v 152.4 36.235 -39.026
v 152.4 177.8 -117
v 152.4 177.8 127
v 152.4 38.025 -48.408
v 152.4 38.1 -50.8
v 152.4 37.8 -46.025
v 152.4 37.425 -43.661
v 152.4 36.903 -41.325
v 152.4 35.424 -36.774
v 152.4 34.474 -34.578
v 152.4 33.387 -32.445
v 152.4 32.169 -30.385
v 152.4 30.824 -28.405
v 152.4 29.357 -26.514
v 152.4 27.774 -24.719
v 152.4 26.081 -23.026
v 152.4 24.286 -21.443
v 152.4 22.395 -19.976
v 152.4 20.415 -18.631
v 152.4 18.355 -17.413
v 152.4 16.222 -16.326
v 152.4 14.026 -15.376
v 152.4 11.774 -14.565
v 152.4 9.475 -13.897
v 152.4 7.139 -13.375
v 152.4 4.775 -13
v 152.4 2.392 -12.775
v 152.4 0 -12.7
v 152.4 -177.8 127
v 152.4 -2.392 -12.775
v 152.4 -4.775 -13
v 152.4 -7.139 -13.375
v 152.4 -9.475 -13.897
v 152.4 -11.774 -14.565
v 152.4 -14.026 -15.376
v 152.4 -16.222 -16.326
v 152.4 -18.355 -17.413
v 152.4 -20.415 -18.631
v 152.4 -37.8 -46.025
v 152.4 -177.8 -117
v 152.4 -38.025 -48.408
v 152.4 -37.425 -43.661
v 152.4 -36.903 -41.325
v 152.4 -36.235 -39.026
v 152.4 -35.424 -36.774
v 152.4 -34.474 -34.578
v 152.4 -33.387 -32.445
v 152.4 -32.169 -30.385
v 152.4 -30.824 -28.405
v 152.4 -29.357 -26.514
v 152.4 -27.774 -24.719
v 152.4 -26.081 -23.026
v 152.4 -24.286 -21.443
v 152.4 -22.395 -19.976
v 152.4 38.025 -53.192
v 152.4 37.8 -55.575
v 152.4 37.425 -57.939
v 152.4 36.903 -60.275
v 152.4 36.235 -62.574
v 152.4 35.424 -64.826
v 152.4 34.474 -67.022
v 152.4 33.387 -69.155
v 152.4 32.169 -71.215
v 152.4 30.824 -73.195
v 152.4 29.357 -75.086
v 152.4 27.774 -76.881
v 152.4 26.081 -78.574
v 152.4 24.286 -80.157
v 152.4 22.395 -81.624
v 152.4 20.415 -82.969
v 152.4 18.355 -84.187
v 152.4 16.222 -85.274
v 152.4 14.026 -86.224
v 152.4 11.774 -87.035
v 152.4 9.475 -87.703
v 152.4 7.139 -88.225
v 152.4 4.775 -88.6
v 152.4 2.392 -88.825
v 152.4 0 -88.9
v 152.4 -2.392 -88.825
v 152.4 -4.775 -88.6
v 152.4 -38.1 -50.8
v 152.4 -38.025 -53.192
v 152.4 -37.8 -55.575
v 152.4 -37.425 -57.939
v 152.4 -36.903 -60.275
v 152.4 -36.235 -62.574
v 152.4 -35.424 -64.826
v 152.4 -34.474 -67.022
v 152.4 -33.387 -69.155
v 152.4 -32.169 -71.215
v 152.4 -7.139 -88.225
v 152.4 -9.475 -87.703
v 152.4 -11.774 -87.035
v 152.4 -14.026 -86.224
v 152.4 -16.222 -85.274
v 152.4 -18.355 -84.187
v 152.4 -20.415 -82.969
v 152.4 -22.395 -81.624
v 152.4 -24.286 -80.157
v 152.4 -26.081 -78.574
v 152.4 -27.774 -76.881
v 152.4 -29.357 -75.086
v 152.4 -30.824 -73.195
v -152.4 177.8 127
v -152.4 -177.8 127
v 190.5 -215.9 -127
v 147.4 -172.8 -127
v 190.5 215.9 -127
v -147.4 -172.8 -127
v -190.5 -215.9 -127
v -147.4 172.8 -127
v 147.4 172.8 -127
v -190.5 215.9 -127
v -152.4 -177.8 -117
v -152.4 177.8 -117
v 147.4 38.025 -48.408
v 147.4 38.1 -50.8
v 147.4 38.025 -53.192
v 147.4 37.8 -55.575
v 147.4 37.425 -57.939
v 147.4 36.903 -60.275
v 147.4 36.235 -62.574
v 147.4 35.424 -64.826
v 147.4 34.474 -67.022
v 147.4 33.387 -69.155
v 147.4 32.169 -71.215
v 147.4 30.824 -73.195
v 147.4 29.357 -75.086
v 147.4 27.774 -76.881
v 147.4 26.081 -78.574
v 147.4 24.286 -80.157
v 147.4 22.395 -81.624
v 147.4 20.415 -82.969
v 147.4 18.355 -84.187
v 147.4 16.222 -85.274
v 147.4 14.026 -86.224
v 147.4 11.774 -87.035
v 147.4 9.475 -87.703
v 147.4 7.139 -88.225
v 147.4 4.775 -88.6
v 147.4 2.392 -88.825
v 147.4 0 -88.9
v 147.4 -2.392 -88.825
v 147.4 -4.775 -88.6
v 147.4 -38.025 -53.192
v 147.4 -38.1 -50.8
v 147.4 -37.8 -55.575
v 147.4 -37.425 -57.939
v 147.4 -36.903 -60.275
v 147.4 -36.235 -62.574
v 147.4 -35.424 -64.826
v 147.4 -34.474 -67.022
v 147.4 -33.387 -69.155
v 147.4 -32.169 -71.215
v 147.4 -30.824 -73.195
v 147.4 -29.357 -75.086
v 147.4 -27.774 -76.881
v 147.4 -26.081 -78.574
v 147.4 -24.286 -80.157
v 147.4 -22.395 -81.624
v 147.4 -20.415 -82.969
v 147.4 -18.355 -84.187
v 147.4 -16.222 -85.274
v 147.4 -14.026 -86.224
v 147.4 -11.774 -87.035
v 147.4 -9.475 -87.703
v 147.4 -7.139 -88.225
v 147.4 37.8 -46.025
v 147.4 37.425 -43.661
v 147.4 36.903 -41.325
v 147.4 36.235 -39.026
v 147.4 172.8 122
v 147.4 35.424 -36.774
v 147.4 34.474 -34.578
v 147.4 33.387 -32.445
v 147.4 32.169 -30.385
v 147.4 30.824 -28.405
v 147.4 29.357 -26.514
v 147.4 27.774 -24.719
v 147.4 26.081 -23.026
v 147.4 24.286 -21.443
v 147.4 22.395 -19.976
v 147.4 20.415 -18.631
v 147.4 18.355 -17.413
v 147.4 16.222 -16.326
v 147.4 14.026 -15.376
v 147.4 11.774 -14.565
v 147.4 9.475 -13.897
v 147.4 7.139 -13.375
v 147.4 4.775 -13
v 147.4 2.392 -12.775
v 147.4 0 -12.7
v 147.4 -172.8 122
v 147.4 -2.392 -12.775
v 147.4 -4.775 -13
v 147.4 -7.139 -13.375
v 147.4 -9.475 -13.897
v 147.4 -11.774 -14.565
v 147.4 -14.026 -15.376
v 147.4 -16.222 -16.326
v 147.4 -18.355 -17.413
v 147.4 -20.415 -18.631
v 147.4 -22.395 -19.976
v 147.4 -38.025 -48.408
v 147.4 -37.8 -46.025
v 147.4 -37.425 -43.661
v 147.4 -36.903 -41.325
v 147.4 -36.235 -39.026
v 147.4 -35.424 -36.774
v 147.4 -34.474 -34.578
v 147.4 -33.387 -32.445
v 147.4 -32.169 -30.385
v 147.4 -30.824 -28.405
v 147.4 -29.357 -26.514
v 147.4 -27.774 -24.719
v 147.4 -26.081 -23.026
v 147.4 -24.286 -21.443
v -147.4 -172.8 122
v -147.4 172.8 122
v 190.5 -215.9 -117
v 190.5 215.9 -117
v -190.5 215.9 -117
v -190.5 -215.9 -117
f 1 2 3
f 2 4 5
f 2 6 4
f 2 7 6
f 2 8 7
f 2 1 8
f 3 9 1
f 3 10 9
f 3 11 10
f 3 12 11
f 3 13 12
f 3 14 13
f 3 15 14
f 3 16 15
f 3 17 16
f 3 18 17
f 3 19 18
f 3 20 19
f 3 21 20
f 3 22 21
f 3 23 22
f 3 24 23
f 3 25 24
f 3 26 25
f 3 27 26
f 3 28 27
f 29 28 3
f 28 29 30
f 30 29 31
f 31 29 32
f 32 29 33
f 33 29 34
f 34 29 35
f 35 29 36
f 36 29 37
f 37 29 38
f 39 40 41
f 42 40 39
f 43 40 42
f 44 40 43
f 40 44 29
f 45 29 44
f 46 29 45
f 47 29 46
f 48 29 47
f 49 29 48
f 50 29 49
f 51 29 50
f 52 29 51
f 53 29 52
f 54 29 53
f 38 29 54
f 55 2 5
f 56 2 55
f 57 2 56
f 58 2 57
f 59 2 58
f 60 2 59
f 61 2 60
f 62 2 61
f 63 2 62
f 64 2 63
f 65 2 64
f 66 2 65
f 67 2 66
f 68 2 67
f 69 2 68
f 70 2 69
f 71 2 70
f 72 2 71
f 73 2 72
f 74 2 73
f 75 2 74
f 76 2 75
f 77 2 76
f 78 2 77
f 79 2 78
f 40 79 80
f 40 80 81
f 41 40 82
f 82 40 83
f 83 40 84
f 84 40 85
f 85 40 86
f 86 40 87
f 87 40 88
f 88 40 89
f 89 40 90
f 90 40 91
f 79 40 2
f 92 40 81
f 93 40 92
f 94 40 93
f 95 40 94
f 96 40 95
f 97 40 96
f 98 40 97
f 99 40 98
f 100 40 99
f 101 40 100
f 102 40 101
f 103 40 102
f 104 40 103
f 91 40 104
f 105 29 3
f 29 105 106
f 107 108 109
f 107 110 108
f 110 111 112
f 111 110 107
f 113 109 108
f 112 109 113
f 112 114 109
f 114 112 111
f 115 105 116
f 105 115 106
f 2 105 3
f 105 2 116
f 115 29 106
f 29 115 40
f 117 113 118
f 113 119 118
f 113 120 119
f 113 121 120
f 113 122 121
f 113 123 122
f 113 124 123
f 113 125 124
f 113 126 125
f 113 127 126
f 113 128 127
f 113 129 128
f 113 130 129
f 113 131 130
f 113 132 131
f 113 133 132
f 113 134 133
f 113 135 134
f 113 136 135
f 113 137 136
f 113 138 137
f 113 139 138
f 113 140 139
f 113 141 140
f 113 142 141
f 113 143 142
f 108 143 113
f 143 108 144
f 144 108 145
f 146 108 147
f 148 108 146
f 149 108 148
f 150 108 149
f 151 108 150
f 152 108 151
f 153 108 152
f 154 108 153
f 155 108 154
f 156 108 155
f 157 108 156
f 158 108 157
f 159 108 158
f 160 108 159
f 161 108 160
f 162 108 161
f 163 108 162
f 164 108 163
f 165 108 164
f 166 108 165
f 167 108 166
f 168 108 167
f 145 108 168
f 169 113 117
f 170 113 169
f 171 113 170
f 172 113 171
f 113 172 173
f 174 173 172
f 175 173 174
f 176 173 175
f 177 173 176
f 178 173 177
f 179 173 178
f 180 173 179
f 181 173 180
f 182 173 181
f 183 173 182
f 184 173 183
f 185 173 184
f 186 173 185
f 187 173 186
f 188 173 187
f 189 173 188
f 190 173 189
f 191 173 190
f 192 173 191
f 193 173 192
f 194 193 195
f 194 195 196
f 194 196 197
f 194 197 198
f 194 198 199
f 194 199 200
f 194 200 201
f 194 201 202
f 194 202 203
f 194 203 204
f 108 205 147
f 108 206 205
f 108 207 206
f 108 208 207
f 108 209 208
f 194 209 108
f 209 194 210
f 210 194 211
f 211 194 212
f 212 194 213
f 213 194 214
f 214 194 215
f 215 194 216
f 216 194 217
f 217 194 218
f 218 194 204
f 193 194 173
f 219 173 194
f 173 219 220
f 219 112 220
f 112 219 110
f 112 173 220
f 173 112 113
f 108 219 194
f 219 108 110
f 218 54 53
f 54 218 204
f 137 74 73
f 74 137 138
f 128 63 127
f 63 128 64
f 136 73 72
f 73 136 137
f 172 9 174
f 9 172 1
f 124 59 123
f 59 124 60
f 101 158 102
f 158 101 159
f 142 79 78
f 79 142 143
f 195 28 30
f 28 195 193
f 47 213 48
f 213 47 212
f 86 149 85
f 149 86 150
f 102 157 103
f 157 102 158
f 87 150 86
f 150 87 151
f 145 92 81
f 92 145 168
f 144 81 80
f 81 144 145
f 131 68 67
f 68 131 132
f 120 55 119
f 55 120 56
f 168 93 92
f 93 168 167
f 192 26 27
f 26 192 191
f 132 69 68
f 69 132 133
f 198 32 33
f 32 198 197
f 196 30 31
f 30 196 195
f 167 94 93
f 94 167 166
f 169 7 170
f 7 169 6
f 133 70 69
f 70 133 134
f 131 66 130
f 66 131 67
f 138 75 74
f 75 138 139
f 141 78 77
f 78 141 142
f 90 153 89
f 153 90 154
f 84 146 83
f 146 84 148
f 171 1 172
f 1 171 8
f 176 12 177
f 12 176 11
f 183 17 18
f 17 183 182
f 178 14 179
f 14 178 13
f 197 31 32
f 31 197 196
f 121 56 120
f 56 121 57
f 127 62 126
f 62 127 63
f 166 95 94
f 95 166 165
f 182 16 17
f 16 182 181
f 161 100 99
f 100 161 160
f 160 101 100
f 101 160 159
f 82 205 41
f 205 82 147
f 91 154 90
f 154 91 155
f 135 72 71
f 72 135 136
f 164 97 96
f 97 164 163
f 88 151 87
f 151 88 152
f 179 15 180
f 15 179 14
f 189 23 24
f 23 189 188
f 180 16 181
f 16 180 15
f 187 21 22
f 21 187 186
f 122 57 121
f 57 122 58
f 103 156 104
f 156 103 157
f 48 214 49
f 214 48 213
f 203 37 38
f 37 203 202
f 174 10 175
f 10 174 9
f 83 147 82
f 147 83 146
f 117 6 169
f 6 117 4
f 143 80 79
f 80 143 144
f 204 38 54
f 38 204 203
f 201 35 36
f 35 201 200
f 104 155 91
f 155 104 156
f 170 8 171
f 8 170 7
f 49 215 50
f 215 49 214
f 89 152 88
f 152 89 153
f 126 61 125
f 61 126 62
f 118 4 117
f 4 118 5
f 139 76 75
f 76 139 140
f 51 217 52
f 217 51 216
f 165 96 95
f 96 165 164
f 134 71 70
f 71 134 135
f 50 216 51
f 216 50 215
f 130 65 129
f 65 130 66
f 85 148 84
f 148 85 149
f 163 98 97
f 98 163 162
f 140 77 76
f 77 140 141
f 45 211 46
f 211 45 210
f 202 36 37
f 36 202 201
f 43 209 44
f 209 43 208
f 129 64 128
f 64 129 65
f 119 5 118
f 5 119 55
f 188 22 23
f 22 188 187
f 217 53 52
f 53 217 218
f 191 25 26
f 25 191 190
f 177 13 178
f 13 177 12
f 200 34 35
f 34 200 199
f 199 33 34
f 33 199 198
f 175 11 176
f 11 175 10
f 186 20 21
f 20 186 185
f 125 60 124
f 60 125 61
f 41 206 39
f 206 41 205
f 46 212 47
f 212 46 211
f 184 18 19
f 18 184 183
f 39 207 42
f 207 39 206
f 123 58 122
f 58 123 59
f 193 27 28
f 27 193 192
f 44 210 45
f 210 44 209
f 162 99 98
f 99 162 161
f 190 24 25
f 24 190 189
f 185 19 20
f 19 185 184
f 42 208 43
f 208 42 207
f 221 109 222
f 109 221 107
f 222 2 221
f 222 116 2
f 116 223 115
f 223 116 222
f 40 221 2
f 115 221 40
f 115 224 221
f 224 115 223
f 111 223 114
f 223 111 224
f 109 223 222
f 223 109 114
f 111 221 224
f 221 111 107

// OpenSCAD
// File Path: src/hardware/univac_sliding_gate_opener.scad
// =========================================================================
// UNIVAC INDUSTRIAL SYSTEMS — RUGGED SLIDING GATE OPENER SHROUD
// Features Sloped Fluid Scuppers and Integrated SSR Actuator Mounts
// =========================================================================

$fn = 100;
inch = 25.4;

box_w = 12.0 * inch;
box_l = 14.0 * inch;
box_h = 10.0 * inch;
wall  = 5.0; // 5mm thick stainless steel chassis casing

module sliding_gate_opener_chassis() {
    difference() {
        // Main protective motor gear shroud box
        cube([box_w, box_l, box_h], center=true);
        // Internal mechanical component cavity
        translate([0, 0, -wall])
            cube([box_w - wall*2, box_l - wall*2, box_h], center=true);
        // Precision output shaft slot for the main rack-and-pinion drive gear
        translate([box_w/2 - 2, 0, -2*inch])
            rotate([0, 90, 0]) cylinder(h=2*inch, r=1.5*inch, center=true);
    }
    
    // Integrated mounting feet tabs to lag directly into ground timber sleepers
    translate([0, 0, -box_h/2 + 5])
        difference() {
            cube([box_w + 3*inch, box_l + 3*inch, 10], center=true);
            cube([box_w - 10, box_l - 10, 20], center=true);
        }
}

color("DarkSubduedGrey") sliding_gate_opener_chassis();
